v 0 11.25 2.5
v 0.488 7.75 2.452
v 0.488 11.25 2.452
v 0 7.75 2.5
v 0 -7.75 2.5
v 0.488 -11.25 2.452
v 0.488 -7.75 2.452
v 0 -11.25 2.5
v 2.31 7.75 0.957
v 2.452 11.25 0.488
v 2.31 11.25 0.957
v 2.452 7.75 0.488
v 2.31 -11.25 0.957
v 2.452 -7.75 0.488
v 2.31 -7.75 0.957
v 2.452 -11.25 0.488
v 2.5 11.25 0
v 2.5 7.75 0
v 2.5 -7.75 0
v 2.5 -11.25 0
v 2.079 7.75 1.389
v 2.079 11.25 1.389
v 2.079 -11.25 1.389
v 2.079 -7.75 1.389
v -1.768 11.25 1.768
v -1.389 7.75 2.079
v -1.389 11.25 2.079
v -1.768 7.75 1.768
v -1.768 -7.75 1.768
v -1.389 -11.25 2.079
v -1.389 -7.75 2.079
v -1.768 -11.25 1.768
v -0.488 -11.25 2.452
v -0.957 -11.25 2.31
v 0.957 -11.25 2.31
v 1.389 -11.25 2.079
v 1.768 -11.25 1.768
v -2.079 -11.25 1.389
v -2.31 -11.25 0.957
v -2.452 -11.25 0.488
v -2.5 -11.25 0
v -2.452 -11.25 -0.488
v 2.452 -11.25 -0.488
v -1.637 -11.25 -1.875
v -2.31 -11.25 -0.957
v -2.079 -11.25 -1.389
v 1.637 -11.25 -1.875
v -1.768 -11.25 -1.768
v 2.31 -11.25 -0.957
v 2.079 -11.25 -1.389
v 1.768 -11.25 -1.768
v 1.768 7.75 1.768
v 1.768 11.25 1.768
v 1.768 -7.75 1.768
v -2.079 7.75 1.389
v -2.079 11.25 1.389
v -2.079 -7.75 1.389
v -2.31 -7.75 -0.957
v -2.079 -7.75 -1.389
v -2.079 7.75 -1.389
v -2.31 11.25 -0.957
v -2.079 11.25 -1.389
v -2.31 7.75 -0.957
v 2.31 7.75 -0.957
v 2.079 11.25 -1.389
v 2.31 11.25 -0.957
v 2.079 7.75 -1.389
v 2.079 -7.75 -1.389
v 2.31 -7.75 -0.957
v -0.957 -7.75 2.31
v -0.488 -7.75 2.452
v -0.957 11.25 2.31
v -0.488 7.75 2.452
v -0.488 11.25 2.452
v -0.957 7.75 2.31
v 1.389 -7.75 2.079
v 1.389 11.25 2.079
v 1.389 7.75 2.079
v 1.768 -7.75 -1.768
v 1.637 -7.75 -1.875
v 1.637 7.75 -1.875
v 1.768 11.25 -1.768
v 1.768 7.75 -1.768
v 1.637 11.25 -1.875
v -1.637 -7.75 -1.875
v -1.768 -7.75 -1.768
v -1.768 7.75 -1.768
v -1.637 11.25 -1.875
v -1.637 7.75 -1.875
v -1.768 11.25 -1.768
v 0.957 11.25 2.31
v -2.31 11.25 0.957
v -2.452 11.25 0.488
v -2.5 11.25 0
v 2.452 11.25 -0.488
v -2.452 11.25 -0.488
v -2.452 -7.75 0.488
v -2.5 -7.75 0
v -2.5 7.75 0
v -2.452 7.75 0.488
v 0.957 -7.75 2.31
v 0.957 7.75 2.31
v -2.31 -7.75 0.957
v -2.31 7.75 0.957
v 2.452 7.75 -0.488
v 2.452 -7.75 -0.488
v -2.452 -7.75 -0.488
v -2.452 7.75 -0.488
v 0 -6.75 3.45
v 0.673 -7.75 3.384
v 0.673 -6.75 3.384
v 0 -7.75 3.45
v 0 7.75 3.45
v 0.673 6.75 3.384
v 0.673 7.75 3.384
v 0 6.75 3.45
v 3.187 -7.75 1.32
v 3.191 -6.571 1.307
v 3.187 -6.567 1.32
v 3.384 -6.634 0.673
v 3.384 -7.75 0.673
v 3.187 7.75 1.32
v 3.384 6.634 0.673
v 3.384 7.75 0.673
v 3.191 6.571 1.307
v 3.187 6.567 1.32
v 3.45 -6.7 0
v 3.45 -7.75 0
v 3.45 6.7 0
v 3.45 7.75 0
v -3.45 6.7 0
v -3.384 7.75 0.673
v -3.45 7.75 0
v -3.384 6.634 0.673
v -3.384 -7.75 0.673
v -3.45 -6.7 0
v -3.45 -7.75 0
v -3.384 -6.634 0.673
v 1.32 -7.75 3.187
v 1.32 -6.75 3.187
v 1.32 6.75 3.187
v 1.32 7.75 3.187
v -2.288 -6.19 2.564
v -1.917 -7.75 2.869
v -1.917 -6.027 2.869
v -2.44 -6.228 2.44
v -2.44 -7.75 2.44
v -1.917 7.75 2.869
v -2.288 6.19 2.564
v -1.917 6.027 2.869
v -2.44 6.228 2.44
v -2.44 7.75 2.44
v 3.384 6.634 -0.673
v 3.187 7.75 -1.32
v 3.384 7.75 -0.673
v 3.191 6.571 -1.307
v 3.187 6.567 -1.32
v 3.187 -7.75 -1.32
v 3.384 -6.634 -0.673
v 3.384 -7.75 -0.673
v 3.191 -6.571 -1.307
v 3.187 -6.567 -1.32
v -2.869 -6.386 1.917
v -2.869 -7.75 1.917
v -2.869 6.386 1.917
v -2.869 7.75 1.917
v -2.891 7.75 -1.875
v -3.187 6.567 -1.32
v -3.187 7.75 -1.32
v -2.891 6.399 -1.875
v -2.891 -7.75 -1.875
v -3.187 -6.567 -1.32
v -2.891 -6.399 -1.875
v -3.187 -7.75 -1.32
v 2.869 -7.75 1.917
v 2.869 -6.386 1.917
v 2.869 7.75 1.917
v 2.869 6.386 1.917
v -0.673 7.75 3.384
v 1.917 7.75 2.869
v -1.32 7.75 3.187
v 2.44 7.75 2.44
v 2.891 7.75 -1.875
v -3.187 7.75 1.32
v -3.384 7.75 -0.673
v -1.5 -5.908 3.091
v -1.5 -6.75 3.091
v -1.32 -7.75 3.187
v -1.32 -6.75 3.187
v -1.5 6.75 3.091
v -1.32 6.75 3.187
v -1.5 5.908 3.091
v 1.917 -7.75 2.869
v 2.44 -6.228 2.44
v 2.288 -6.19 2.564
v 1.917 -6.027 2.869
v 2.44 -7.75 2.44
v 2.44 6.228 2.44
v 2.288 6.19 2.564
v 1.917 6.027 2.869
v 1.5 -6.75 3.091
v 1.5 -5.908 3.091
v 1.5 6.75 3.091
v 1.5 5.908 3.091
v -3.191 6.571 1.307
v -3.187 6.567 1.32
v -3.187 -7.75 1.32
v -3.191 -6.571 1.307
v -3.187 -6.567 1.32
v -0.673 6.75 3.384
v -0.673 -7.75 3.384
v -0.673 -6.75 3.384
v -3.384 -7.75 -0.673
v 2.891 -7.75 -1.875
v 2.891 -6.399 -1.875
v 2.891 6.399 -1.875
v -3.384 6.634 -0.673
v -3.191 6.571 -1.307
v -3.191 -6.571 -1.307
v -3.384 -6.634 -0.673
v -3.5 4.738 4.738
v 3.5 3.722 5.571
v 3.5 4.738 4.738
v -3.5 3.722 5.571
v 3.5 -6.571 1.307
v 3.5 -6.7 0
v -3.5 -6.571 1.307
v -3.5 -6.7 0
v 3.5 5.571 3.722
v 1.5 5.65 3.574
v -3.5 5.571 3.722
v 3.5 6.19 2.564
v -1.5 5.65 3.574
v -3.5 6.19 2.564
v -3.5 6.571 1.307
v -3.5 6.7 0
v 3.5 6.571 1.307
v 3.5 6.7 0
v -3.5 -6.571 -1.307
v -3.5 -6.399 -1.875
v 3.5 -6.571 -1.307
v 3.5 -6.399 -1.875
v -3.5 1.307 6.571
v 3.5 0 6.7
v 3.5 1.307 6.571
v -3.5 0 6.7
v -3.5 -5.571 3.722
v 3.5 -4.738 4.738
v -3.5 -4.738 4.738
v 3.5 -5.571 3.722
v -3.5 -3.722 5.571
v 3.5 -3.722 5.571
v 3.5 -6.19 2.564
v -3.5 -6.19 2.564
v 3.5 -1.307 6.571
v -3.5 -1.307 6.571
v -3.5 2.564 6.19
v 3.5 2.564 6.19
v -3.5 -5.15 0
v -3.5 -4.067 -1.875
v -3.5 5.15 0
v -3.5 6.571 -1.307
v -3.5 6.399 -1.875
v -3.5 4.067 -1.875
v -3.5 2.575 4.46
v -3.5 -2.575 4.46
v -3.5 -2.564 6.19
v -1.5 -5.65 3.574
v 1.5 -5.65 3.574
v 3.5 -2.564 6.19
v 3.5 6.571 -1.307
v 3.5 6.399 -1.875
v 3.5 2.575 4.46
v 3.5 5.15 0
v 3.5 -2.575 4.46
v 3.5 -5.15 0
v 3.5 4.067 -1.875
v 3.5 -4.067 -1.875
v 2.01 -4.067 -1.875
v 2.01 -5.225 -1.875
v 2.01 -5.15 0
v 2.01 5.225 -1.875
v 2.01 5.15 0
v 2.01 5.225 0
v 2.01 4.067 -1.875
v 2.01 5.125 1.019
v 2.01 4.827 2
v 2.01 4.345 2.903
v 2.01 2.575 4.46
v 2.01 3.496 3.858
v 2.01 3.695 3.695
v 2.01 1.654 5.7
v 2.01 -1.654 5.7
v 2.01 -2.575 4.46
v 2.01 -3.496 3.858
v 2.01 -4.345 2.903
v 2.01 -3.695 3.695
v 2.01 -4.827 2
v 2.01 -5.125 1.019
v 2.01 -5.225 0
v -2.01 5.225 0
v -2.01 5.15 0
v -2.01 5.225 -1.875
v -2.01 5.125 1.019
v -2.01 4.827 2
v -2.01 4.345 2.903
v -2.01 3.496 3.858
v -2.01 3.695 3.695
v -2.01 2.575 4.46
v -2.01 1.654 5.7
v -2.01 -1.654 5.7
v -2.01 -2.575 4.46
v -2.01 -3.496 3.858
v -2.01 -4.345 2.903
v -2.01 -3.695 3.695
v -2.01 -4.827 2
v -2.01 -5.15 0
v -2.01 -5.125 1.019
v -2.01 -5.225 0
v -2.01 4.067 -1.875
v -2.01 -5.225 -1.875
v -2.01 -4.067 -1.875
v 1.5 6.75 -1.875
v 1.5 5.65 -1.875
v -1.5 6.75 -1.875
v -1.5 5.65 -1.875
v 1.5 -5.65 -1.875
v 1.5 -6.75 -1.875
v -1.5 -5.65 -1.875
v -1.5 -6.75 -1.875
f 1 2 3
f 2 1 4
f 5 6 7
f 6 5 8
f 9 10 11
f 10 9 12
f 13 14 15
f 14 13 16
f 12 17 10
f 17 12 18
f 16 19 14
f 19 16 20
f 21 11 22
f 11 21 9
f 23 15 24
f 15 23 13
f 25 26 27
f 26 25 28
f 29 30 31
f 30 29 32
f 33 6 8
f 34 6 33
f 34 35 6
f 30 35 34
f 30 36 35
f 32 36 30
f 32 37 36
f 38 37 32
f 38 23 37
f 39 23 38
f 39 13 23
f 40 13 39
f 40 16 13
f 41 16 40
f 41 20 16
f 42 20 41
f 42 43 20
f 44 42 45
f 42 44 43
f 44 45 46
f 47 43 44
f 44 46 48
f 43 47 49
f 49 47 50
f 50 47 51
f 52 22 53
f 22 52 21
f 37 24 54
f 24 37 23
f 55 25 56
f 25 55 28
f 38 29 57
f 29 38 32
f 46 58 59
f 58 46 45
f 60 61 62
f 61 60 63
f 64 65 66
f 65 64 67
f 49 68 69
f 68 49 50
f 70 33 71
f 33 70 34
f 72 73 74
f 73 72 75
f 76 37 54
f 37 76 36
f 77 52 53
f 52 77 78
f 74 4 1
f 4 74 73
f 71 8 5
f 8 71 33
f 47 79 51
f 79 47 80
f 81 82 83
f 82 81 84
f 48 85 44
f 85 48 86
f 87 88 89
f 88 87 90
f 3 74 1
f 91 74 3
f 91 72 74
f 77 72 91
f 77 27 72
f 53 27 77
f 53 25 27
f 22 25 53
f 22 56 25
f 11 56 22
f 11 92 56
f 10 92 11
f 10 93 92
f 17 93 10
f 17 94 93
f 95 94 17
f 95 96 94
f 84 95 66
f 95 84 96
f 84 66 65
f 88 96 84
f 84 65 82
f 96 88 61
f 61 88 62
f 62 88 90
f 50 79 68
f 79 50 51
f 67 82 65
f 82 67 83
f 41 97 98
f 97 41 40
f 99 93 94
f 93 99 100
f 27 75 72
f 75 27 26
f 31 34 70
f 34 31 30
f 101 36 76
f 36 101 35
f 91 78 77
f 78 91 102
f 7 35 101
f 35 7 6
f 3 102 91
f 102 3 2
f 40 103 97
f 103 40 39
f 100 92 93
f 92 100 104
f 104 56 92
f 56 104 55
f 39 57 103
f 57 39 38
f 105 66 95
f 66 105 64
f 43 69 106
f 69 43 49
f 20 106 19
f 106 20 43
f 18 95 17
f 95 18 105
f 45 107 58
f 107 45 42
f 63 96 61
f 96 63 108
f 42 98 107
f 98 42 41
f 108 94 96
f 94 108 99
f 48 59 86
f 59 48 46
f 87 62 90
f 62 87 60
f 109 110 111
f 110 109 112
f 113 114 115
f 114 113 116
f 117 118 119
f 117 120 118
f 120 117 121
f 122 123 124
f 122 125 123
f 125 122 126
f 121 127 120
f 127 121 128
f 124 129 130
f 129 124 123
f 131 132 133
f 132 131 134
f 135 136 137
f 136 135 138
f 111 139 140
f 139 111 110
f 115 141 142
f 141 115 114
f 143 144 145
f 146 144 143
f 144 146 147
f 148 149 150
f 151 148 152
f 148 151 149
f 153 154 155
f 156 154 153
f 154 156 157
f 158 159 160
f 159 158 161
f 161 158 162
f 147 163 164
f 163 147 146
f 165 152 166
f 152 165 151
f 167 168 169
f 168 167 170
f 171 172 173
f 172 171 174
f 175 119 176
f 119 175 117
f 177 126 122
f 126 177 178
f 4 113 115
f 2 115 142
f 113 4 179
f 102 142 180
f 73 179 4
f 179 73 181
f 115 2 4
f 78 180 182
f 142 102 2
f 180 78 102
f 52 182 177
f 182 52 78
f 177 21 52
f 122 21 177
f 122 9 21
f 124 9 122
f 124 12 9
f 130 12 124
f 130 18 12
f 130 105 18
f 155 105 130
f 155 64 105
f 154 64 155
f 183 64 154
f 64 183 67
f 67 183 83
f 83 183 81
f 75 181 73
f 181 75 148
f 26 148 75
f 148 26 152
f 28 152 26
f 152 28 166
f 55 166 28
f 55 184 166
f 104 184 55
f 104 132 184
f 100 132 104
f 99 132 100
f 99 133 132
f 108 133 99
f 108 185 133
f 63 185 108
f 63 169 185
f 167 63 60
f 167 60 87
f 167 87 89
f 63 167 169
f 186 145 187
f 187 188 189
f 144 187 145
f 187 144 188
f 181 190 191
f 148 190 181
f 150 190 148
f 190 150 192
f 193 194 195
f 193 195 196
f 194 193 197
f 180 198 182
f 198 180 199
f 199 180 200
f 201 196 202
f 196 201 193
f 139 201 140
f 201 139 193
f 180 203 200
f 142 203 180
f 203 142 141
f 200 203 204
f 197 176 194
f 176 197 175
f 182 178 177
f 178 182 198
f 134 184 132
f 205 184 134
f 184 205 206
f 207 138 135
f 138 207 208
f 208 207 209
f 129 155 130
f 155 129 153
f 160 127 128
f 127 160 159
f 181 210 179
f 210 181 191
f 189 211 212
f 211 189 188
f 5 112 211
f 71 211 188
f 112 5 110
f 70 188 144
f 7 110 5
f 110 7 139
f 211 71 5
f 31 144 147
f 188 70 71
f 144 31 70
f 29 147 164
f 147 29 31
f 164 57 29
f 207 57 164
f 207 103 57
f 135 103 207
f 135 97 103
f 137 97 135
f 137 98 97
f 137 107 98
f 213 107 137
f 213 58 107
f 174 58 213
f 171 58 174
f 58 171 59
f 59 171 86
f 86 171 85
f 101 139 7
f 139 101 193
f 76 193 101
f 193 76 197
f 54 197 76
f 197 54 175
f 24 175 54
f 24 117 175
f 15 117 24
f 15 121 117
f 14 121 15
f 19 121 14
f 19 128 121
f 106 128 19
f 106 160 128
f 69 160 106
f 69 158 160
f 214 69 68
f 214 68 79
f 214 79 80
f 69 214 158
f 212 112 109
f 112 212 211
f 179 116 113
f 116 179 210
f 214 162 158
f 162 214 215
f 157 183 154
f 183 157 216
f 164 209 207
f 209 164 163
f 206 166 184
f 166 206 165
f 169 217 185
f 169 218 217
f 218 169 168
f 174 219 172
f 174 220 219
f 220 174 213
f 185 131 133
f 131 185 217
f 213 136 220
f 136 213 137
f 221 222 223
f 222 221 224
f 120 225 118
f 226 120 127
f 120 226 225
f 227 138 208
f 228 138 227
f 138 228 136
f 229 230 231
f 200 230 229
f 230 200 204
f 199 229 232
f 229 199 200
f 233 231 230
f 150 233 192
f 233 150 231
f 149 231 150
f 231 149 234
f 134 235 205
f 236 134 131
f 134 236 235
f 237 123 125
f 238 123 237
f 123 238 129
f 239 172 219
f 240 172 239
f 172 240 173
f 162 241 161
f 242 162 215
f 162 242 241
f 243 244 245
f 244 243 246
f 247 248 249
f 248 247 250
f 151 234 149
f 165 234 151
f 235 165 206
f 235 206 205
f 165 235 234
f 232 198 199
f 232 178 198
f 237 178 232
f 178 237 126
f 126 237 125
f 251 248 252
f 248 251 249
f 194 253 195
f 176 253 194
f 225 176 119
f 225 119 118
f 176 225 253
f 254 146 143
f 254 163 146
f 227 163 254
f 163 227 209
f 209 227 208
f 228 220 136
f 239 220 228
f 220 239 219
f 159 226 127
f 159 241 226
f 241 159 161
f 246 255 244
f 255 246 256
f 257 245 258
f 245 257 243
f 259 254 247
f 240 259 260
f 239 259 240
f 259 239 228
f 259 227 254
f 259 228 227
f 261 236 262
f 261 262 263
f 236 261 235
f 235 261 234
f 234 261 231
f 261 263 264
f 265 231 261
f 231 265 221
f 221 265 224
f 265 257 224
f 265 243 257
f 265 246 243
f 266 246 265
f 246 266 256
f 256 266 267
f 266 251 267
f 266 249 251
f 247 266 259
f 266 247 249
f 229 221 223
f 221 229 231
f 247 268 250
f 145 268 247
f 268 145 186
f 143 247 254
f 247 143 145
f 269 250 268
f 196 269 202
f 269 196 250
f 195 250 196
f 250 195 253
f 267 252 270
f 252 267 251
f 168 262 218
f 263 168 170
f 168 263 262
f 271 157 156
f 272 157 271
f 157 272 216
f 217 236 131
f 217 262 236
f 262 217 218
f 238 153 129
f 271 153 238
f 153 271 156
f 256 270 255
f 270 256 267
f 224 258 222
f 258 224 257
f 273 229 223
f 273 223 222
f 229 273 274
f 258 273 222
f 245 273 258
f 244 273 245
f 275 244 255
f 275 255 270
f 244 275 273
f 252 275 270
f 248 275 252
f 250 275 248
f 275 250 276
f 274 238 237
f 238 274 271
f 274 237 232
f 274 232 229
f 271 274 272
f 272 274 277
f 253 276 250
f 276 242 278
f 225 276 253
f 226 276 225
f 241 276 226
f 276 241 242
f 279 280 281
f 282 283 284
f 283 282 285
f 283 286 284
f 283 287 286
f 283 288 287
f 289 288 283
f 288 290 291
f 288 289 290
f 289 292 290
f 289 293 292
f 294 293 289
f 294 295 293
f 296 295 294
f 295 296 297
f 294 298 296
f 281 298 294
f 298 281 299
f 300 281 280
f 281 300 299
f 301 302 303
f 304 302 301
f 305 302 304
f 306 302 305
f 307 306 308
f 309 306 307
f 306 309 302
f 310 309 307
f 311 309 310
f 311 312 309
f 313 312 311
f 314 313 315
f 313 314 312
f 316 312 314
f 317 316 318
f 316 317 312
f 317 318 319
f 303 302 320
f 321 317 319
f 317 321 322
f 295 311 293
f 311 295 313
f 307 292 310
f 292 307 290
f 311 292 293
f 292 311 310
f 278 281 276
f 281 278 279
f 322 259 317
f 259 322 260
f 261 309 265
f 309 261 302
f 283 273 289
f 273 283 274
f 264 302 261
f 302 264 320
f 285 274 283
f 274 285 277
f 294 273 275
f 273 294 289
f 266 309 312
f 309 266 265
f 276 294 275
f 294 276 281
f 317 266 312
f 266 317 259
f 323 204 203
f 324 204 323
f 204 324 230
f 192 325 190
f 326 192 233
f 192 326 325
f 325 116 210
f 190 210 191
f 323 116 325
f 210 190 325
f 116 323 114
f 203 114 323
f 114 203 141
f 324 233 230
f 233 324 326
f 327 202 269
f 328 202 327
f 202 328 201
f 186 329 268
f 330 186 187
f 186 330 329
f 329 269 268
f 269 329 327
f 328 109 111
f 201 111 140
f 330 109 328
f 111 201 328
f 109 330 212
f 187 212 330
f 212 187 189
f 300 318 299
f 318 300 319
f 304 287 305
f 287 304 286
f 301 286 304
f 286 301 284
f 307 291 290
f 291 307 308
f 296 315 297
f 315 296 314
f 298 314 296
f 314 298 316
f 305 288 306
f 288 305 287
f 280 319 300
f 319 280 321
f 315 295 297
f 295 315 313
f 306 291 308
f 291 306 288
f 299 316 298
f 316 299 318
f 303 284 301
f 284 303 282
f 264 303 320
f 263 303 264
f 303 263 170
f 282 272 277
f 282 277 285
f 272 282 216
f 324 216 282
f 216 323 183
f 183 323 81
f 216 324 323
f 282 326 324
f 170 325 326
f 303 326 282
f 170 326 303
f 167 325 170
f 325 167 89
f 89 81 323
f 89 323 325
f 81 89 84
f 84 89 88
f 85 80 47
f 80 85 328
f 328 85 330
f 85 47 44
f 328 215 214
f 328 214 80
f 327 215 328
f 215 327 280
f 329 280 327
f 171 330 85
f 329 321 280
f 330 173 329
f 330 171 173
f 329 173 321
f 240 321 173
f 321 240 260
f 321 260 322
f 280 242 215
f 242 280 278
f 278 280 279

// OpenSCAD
// file: configuration.scad
$fn = 18;

wall = 5;

bolt_slop = .5;
nut_slop = .85;
bolt_dia = 5+bolt_slop;
bolt_rad = bolt_dia/2;
bolt_cap_dia = 10+bolt_slop;
bolt_cap_rad = bolt_cap_dia/2;
nut_dia = 9+nut_slop;
nut_rad = nut_dia/2;
nut_height = 3;
lock_nut_height = 5.25;

ext_x = 20;
ext_y = 60;
// main file
include <configuration.scad>;
use <effectors.scad>;

arm_sep = 70;

//Requires 8 625 2RS ball bearings per arm!
bearing_rad = 16/2+.15;
bearing_width = 5+.3;
bearing_bore = 5/2;
bearing_core = 8/2;
bearing_rim = 12/2;
lock_lip = .25;

rod_end_length = 40;
rod_end_thickness = 8.25;


rim = -.05;

//this holds 4 bearings - two on the outsides of the rail effector, and two at right angles to them.
//vertical_bearing();

//%arm_mounts();
//bearing_arm(35,3);
$fn=32;

//bearing_arm_hex(25);

//stacked_bearing(.01);

//right_angle(wall=4);

//%cylinder(r=13, h=10, center=true); 

in = 2;
//miniujoint(sep = .4, sphere=12, inset = in);
//ujointarm(sep = .4, sphere=12, inset = in, slop = .5);

%cube([5,27,5],center=true);
//rotate([0,-90,0]) 
triplebearing();
//triplebearingarm(sep = 2, sphere=10, inset = in, slop = .5);

//doublebearing();

module doublebearing(sep = 3, wall=3){
	bearing_rad = 5.2;
	bearing_thick = 4;

	offset = bearing_thick/2+wall/2+sep+bearing_rad;

	difference(){
		union(){
			rotate([0,90,0]) tiny_bearing(1,0,wall);

			//arms
			for(i=[0,1]) mirror([0,i,0]) translate([offset/2, bearing_rad+wall/2, 0]) cube([offset+wall/2+bearing_rad+.3, wall, bolt_rad*2+wall],center=true);
		}
		rotate([0,90,0]) tiny_bearing(0,0,wall);
	
		#translate([offset, 0, 0]) rotate([90,0,0]) cylinder(r=bolt_rad, h=30, center=true);

		#translate([offset, 0, 0]) rotate([90,0,0]) cylinder(r=bearing_rad, h=bearing_thick, center=true);

		//clean up the bottom
		translate([0,0,-9]) cube([30,30,10], center=true);
	}
}

module doublebearingarm(){
}


module triplebearing(){
	bearing_rad = 5.2;
	bearing_thick = 4;
	wall = 3;

	bearing_sep = bearing_rad*2+wall+2.1;
	echo("Dist between bearings:",bearing_sep);

	difference(){
		union(){
			//bar
			rotate([90,0,0]){
				cylinder(r=bolt_rad-.25, h=bearing_sep+bearing_thick*2-1, center=true);
				cylinder(r=bearing_rad-1.75, h=bearing_sep, center=true);
			}
			
			//center bearing
			rotate([0,90,0]) tiny_bearing(1,0,wall,1);
		}
		
		//center bearing cutout
		rotate([0,90,0]) tiny_bearing(0,0,wall,2);
		
		//flatten
		translate([0,0,-bearing_sep-bolt_rad/2-.5]) cube([bearing_sep*2, bearing_sep*2, bearing_sep*2],center=true);
	}
}

module triplebearingarm(sep = 0, sphere = 10, slop=.25){
  bearing_rad = 5.2;
	bearing_thick = 4;
	wall = 3;

	height = bearing_rad*2+wall*2+1;

	bearing_sep = bearing_rad*2+wall+2.1;
	echo("Dist between bearings:",bearing_sep);//15.5 now

	width = bearing_rad*2+bearing_thick*2+sep*2;

difference(){
	difference(){
		union(){
			hull(){
				for(i=[0,1]) mirror([0,i,0]){
					rotate([-90,0,0]) cylinder(r=height/2/cos(30), h=bearing_sep+wall+bearing_thick*2, center=true, $fn=6);
					
					translate([0,bearing_sep/2+bearing_thick/2,0]) rotate([90,90,0]) tiny_bearing(1,1,wall,0);
					
				}
			
				//add the arm grabber
				translate([-rod_end_length/2,0,0]) cube([rod_end_length,rod_end_thickness+wall,height], center=true);
			}
		}

		for(i=[0,1]) mirror([0,i,0]){
			translate([0,bearing_sep/2+bearing_thick/2,0]) rotate([90,90,0]) tiny_bearing(0,1,wall,0);
		
			//bearing hole
			*hull(){
				translate([0,bearing_sep/2,0]) rotate([-90,0,0]) cylinder(r=bearing_rad*cos(180/$fn)+.1, h=bearing_thick);
				translate([0,bearing_sep/2,-10]) rotate([-90,0,0]) cylinder(r=bearing_rad*cos(180/$fn)+.1, h=bearing_thick);
			}
			//center hole
			*difference(){
				translate([0,bearing_sep/2,0]) rotate([-90,0,0]) cylinder(r=8/2, h=bearing_thick+1.1);
				translate([0,bearing_sep/2+1,-6]) cube([10,10,10], center=true);
			}

			//teardrop the top
			*intersection(){
				translate([0,bearing_sep/2,0]) rotate([-90,-135,0]) cube([bearing_rad*cos(180/$fn)+.1,bearing_rad*cos(180/$fn)+.1,bearing_thick]);
				translate([0,bearing_sep/2,0]) rotate([-90,180/8,0]) cylinder(r=(bearing_rad*cos(180/$fn)+.1)/cos(180/8),h=10, $fn=8);
			}

			//make a zip tie slot
			translate([0,bearing_sep/2+wall-.5,0]) rotate([90,0,0]) rotate_extrude(convexity = 10){
				translate([bearing_rad+1.5+.7, .5, 0]) scale([1,1]) rotate(a=30) circle(r=1, center=true, $fn=6);
				translate([bearing_rad+1.5+.7, -.5, 0]) scale([1,1]) rotate(a=30) circle(r=1, center=true, $fn=6);
			}
		}

		//hole for the arm
		translate([-rod_end_length/2,0,0]) cube([rod_end_length+1,8.2,8.2], center=true);

		//hollow out the joint itself
		hull(){
			//translate([-bearing_sep/2,0,0]) 
			intersection(){
				sphere(r=sphere+slop);
				cube([width*2, sphere*2-4, width*2], center=true);
			}
			translate([-bearing_sep/2,0,0]) sphere(r=sphere-2);
	
			translate([bearing_sep/2,0,0]) intersection(){
				sphere(r=sphere+slop);
				cube([width*2, sphere*2-4, width*2], center=true);
			}

			//slope the bearing insert path
			*intersection(){
				translate([0,0,-bearing_rad/2-wall/4]) rotate([0,0,45]) cylinder(r2=(sphere*2-4)/2/cos(180/4), r1=(sphere*2)/2/cos(180/4),h=bearing_rad+wall, center=true, $fn=4);
				translate([wall/2,0,0]) cube([bearing_rad*2+wall,bearing_sep*2,bearing_rad*5], center=true);
			}
		}

		//nut trap
		*translate([-bearing_sep-wall/2,0,0]) rotate([90,0,0]){
			//rotate([0,0,30]) 
			cylinder(r=nut_rad, h=rod_end_thickness+lock_nut_height*2, center=true, $fn=6);
			cylinder(r=bolt_rad, h=rod_end_thickness+lock_nut_height*2+wall, center=true);
			for(i=[0,1])
				mirror([0,0,i]) translate([0,0,rod_end_thickness/2+lock_nut_height+wall/2-.1]) cylinder(r=bolt_cap_rad, h=rod_end_thickness);
		}
		//nut trap
		translate([-rod_end_length+bolt_rad*2, 0, -rod_end_thickness/2-nut_height]){
			cylinder(r=nut_rad, h=nut_height+.1, $fn=6);
			translate([-nut_rad,0,0]) cylinder(r=nut_rad, h=nut_height+.1, $fn=6);
			cylinder(r=bolt_rad, h=nut_height*2, center=true);
		}
	}

	//flatten the base
	translate([0,0,11]) rotate([0,10,0]) cube([100,100,20], center=true);

}
}

module ujointarm(sep = 0, sphere = 10, slop=.25){
	bearing_rad = 5.2;
	bearing_thick = 4;

	width = bearing_rad*2+bearing_thick*2+sep*2;

	difference(){
		union(){
			translate([-width/2-wall+1,0,0]) cube([width+wall*2, width+wall*2-inset*2, wall*2], center=true);
			translate([1,0,0]) rotate([90,0,0]) cylinder(r=wall, h=width+wall*2-inset*2, center=true);
		}

		//bolt hole
		rotate([90,0,0]) cylinder(r=bolt_rad, h=width*2, center=true);

		//nut trap
		for(i=[0,1]) mirror([0,i,0]) rotate([90,0,0]) rotate([0,0,0]) translate([0,0,width/2+slop/2-.01-inset]) cylinder(r=nut_rad, h=nut_height+.1, $fn=6);

		//hollow out the middle
		intersection(){
			sphere(r=sphere+slop);
			cube([width*2, width+slop-inset*2, width*2], center=true);
		}
	}
}

module miniujoint(sep=0, sphere=10, inset = 0){
	bearing_rad = 5.2;
	bearing_thick = 4;
	
	width = bearing_rad*2+bearing_thick*2+sep*2;
	height = bearing_rad*2-2-.2;

	rounding = 2;

	//%cube([width, width-4, wall*2], center=true);

	difference(){
		union(){
			intersection(){
				sphere(r=sphere);
				minkowski(){
					cube([width-rounding*2, width-rounding*2-inset*2, height], center=true);
					cylinder(r=rounding, h=.1, center=true);
				}
				echo("Square Size:",width);
			}
		}
	
		for(i=[0:90:359]){
			echo(inset*(i%180/90));
			rotate([0,0,i]) rotate([90,0,0]){
				translate([0,0,width/2-bearing_thick+.01+inset*(i%180/90-1)]) cylinder(r=bearing_rad, h=bearing_thick);
				translate([0,0,width/2-bearing_thick+.01+inset*(i%180/90-1)-1]) cylinder(r=bearing_rad-1, h=bearing_thick);
				translate([0,0,width/2-bearing_thick+.01+inset*(i%180/90-1)-1]) rotate([0,0,45]) cube([bearing_rad-1, bearing_rad-1, bearing_thick]);
				
				if(sep >= 3) translate([0,0,bearing_rad-nut_height+sep]) cylinder(r=nut_rad, h=nut_height+.1, $fn=6);
				cylinder(r=bolt_rad, h=bearing_rad+.1+sep);
			}
		}
	}
}

module right_angle(){
	offset = bearing_rad+bearing_width/2;
	difference(){
		union(){
			for(i=[0,90]){
				rotate([0,90,i]) translate([0,0,offset]){
					hex_bearing(1,0,wall);
					translate([+bearing_rad/2+wall/4,0,0]) cube([bearing_rad+wall/2,bearing_rad*2+wall,bearing_width+wall], center=true);
					rotate([0,0,90-i*2]) translate([+bearing_rad/2+wall/4,0,0]) cube([bearing_rad+wall/2,bearing_rad*2+wall,bearing_width+wall], center=true);
				}
			}
			//join the middle
			translate([offset,offset,-bearing_rad-wall/2]) rotate([0,0,180/36]) cylinder(r=(bearing_width/2+wall/2)/cos(180/36), h=bearing_rad*2+wall,$fn=36);
		}
		for(i=[0,90])
			rotate([0,90,i]) translate([0,0,offset])
					hex_bearing(0,0,wall);
	}
}

module stacked_bearing(clearance=10){
	difference(){
		union(){
			//hull(){
				//base bearing
				difference(){
					hex_bearing(1,1);
					translate([bearing_width/2+wall/2+10,0,0]) cube([20,bearing_rad*2+wall+1, 50],center=true);
				}
				translate([0,0,(bearing_rad+wall/2)*1.5+clearance]) rotate([0,90,0]) hex_bearing(1,0,wall);

				intersection(){
					translate([0,0,(bearing_width/2-wall/2+clearance+bearing_rad+wall/2)/2]) cube([bearing_width+wall, bearing_rad*2+wall*2, bearing_width+wall+clearance+bearing_rad+wall/2+.2],center=true);
					translate([0,0,-bearing_width/2-wall/2]) cylinder(r1=bearing_rad+wall+1, r2=bearing_rad+wall/2, h=50);
				}
			//}
		}

		//base bearing
		hex_bearing(0,1);
	
		translate([0,0,(bearing_rad+wall/2)*1.5+clearance]) rotate([0,90,0]) hex_bearing(0,0,wall);
		
		//vertical bearing insert path
		translate([0,0,(bearing_width/2-wall/2+clearance+bearing_rad+wall/2)/2-.1]) cube([bearing_width+.1, bearing_rad*2+.1, bearing_width+wall+clearance+bearing_rad+wall/2+.05],center=true);
	
		//bolt room for horizontal bearing
		hull(){
			translate([-10,0,bearing_width/2+wall/2]) cylinder(r1=bearing_rad/cos(30), r2=5, h=clearance, $fn=6);
			translate([10,0,bearing_width/2+wall/2]) cylinder(r1=bearing_rad/cos(30), r2=5, h=clearance, $fn=6);
		}
	}
}

module bearing_arm_hex(length=20){
	difference(){
		union(){
			for(i=[0, 1]){
				mirror([i,0,0]){
					hull(){
						translate([arm_sep/2+bearing_width/2,0,0]) rotate([0,90,0]) hex_bearing(1,0,wall); //vertical bearings
						translate([arm_sep/2+bearing_width/2,0,-wall/2]) cube([bearing_width+wall, bearing_rad*2+wall*1.75, wall], center=true); //add a little extra support for the lower arm
						difference(){
							translate([arm_sep/2-bearing_rad,length,0]) rotate([0,0,90]) hex_bearing(1,false); //horizontal bearings
							translate([arm_sep/2-wall-30,0,-25]) cube([30,50,50]);
						}
					}
					translate([arm_sep/2-bearing_rad,length,0]) rotate([0,0,90]) hex_bearing(1,false); //horizontal bearings
				}
			}
	
			//join the bearings
			front_joint(length);

		}
		for(i=[0, 1]){
			mirror([i,0,0]){
				translate([arm_sep/2+bearing_width/2,0,0]) rotate([0,90,0]) hex_bearing(0,0); //vertical bearings
				translate([arm_sep/2-bearing_rad,length,0]) rotate([0,0,90]) hex_bearing(0,1); //horizontal bearings
			}
		}

		//clearance for the cones
		difference(){
			scale([1.05,1.2,1.2]) arm_mounts();
			for(i=[0,1]) mirror([i,0,0]) translate([arm_sep/2+bearing_width/2,0,-wall/2]) cube([bearing_width+wall, bearing_rad*2+wall*1.75, wall], center=true);
		}

		//flatten the base
		translate([0,0,-arm_sep/2-wall/2-bearing_width/2]) cube([arm_sep*2, arm_sep, arm_sep], center=true);
	}
}

module front_joint(length){
	hex_rad = 3.4;
	difference(){
		translate([0,length,0]) scale([arm_sep/(bearing_rad+wall/2)/2,.9,1]) cylinder(r=bearing_rad+wall/2, h=bearing_width+wall, center=true);

		translate([0,length,0]) scale([arm_sep/(bearing_rad+wall/2)/2-2,.7,1.1]) cylinder(r=bearing_rad+wall/2, h=bearing_width+wall, center=true);

	}
}

module bearing_arm(distance = 30, angle = 10){
	min_thick = (bearing_width+wall/2+wall/4+lock_lip)/2-1;
	//this places it for printing.
	translate([0,0,tan(angle)*30+min_thick])
	rotate([-angle,0,0])
	
	difference(){
		intersection(){
			//bearing mounts
			union(){
				for(i=[0,1]) mirror([i,0,0]) {
					translate([arm_sep/2,0,0]) vertical_bearing(1,1);
					translate([arm_sep/2-bearing_width,distance-bearing_rad-wall/2,-bearing_width/2]) bearing(1, 0);
					echo("Distance Between Centers", (distance-bearing_rad-wall/2));
					hull(){
						render() intersection(){
							union(){
								translate([arm_sep/2-wall/2,0,0]) rotate([0,90,0]) cylinder(r=bearing_rad+wall/2,h=bearing_width+wall/2-.25);
								translate([arm_sep/2-bearing_width,distance-bearing_rad-wall/2,-bearing_width/2-wall/2]) difference(){
									cylinder(r=bearing_rad+wall/2,h=bearing_width+wall/2);
									translate([0,0,-.5]) cylinder(r=bearing_rad,h=bearing_width+wall/2+1);
								}
							}
							translate([arm_sep/2+bearing_width/2+wall/4-wall/2,distance/2-bearing_rad-wall/2,0]) cube([bearing_width+wall/2, distance+3, distance], center=true);
						}
					}
				}
				
				//connect the two sides together
				difference(){
					translate([0,(distance-bearing_rad-wall/2)/2,-min_thick-wall/4]) cube([arm_sep, distance, 14.5], center=true);
					rotate([0,90,0]) cylinder(r=bearing_rad+wall/2, h=arm_sep+1, center=true);
				}
			}

			//slice
			rotate([0,90,0]) intersection(){
				//translate([-min_thick,distance,0]) rotate([0,0,45-angle]) translate([0,-distance,0]) cylinder(r=distance, h=arm_sep*2, center=true, $fn=4);
				translate([min_thick,distance,0]) rotate([0,0,-45+angle]) translate([0,-distance,0]) cylinder(r=distance, h=arm_sep*2, center=true, $fn=4);
			}
		}
	
		for(i=[0,1]) mirror([i,0,0]) {
			//cut out the bearings
			translate([arm_sep/2,0,0]) vertical_bearing(0);
			translate([arm_sep/2-bearing_width,distance-bearing_rad-wall/2,-bearing_width/2]) bearing(0);

			//cinch gaps for the front bearings
			translate([0,(distance-bearing_rad-wall/2+distance)/2,-min_thick-wall/4+14.5/4]) scale([arm_sep-bearing_width*2,14.5/2,arm_sep/2]) sphere(r=.5);
		}
	}
}

module vertical_bearing(solid=1, rim=1){	
	rotate([0,90,0])
	bearing(solid, rim);
}

module bearing(solid=1, rim=1){
	translate([0,0,-wall/2])
	if(solid){
		union(){
			cylinder(r=bearing_rad+wall/2, h=bearing_width+wall/2);
			if(rim){
				translate([0,0,bearing_width+wall/2]) rotate_extrude(convexity = 10){
				
					translate([bearing_rad+wall/4-lock_lip, 0, 0])	circle(r = wall/4+lock_lip);
				}
			}
		}
	}else{
		//hollow out the center
		cylinder(r=bearing_rim, h=30, center=true);
		translate([0,0,wall/2]) cylinder(r=bearing_rad/(cos(180/$fn)), h=bearing_width+.01);
		//make a zip tie slot
		translate([0,0,bearing_width/2+wall/2-lock_lip]) rotate_extrude(convexity = 10){
			translate([bearing_rad+wall/2+.5, .5, 0]) scale([1,1]) rotate(a=30) circle(r=1, center=true, $fn=6);
			translate([bearing_rad+wall/2+.5, -.5, 0]) scale([1,1]) rotate(a=30) circle(r=1, center=true, $fn=6);
		}
	}
}

//trying to make a bearing mount that works with half of a bearing
module hex_bearing(solid=1, vertical=1, wall = 5){
	if(solid){
		union(){
			//bearing surround, with room for supports
			cylinder(r=(bearing_rad+wall/2), h=bearing_width+wall, center=true);
		}
	}else{
		//hollow out the center
		hull(){
			cylinder(r=bearing_rad/(cos(180/$fn)), h=bearing_width+.02, center=true);
			translate([bearing_rad*2,0,0]) cylinder(r=bearing_rad/(cos(180/$fn)), h=bearing_width+.02, center=true);
		}

		if(vertical){
			rotate([0,0,30]) cylinder(r=bearing_rad+rim, h=bearing_width+wall+.01, center=true, $fn=6);
			translate([0,0,(bearing_width+wall+.01)/4]) hull(){
				rotate([0,0,30]) cylinder(r=bearing_rad+rim, h=(bearing_width+wall+.01)/2, center=true, $fn=6);
				translate([bearing_rad,0,0]) rotate([0,0,30]) cylinder(r=bearing_rad+rim, h=(bearing_width+wall+.01)/2, center=true, $fn=6);
			}
		}else{
			translate([0,0,-(bearing_width+.02)/2]) rotate([0,0,90+45]) cube([bearing_rad, bearing_rad,bearing_width+.02]);
			difference(){
				rotate([0,0,30]) cylinder(r=bearing_rad+rim, h=bearing_width+wall+.01, center=true, $fn=6);
				//translate([bearing_width,0,0]) cube([wall/2,bearing_rad*2,bearing_rad*2], center=true);
			}
		}

		//make a zip tie slot
		rotate_extrude(convexity = 10){
			translate([bearing_rad+wall/2+.8, .6, 0]) scale([1,1]) rotate(a=30) circle(r=1.2, center=true, $fn=6);
			translate([bearing_rad+wall/2+.8, -.6, 0]) scale([1,1]) rotate(a=30) circle(r=1.2, center=true, $fn=6);
		}
	}
}




module tiny_bearing(solid=1, vertical=1, wall = 5, zip=1){
	bearing_rad = 5.2;
	bearing_width = 4;

	if(solid){
		union(){
			//bearing surround, with room for supports
			cylinder(r=(bearing_rad+wall/2), h=bearing_width+wall, center=true);
		}
	}else{
		//hollow out the center
		hull(){
			cylinder(r=bearing_rad/(cos(180/$fn)), h=bearing_width+.02, center=true);
			if(!vertical) translate([bearing_rad*2,0,0]) cylinder(r=bearing_rad/(cos(180/$fn)), h=bearing_width+.02, center=true);
		}

		if(vertical){
			rotate([0,0,0]) cylinder(r=bearing_rad+rim, h=bearing_width+wall+.01, center=true, $fn=4);
		
			intersection(){
				translate([0,0,-(bearing_width+.02)/2]) rotate([0,0,90+45]) cube([bearing_rad, bearing_rad,bearing_width+.02]);
				translate([-.5,-bearing_rad,-(bearing_width+.02)/2]) rotate([0,0,90]) cube([bearing_rad*2, bearing_rad,bearing_width+.02]);
			}

			*translate([0,0,(bearing_width+wall+.01)/4]) hull(){
				rotate([0,0,0]) cylinder(r=bearing_rad+rim, h=(bearing_width+wall+.01)/2, center=true, $fn=4);
				translate([bearing_rad,0,0]) rotate([0,0,0]) cylinder(r=bearing_rad+rim, h=(bearing_width+wall+.01)/2, center=true, $fn=4);
			}
		}else{
			intersection(){
				translate([0,0,-(bearing_width+.02)/2]) rotate([0,0,90+45]) cube([bearing_rad, bearing_rad,bearing_width+.02]);
				translate([-.5,-bearing_rad,-(bearing_width+.02)/2]) rotate([0,0,90]) cube([bearing_rad*2, bearing_rad,bearing_width+.02]);
			}
			difference(){
				rotate([0,0,30]) cylinder(r=bearing_rad+rim, h=bearing_width+wall+.01, center=true, $fn=6);
				//translate([bearing_width,0,0]) cube([wall/2,bearing_rad*2,bearing_rad*2], center=true);
			}
		}

		//make a zip tie slot
		if(zip==1){
			rotate_extrude(convexity = 10){
				translate([bearing_rad+1.5+.4, .5, 0]) scale([1,1]) rotate(a=30) circle(r=1, center=true, $fn=6);
				translate([bearing_rad+1.5+.4, -.5, 0]) scale([1,1]) rotate(a=30) circle(r=1, center=true, $fn=6);
			}
		}

		if(zip==2){
			for(i=[0,1]){
				mirror([0,i,0]) translate([0, bearing_rad+1, 0]) cube([20,1.1,3], center=true);
			}
		}
	}
}
